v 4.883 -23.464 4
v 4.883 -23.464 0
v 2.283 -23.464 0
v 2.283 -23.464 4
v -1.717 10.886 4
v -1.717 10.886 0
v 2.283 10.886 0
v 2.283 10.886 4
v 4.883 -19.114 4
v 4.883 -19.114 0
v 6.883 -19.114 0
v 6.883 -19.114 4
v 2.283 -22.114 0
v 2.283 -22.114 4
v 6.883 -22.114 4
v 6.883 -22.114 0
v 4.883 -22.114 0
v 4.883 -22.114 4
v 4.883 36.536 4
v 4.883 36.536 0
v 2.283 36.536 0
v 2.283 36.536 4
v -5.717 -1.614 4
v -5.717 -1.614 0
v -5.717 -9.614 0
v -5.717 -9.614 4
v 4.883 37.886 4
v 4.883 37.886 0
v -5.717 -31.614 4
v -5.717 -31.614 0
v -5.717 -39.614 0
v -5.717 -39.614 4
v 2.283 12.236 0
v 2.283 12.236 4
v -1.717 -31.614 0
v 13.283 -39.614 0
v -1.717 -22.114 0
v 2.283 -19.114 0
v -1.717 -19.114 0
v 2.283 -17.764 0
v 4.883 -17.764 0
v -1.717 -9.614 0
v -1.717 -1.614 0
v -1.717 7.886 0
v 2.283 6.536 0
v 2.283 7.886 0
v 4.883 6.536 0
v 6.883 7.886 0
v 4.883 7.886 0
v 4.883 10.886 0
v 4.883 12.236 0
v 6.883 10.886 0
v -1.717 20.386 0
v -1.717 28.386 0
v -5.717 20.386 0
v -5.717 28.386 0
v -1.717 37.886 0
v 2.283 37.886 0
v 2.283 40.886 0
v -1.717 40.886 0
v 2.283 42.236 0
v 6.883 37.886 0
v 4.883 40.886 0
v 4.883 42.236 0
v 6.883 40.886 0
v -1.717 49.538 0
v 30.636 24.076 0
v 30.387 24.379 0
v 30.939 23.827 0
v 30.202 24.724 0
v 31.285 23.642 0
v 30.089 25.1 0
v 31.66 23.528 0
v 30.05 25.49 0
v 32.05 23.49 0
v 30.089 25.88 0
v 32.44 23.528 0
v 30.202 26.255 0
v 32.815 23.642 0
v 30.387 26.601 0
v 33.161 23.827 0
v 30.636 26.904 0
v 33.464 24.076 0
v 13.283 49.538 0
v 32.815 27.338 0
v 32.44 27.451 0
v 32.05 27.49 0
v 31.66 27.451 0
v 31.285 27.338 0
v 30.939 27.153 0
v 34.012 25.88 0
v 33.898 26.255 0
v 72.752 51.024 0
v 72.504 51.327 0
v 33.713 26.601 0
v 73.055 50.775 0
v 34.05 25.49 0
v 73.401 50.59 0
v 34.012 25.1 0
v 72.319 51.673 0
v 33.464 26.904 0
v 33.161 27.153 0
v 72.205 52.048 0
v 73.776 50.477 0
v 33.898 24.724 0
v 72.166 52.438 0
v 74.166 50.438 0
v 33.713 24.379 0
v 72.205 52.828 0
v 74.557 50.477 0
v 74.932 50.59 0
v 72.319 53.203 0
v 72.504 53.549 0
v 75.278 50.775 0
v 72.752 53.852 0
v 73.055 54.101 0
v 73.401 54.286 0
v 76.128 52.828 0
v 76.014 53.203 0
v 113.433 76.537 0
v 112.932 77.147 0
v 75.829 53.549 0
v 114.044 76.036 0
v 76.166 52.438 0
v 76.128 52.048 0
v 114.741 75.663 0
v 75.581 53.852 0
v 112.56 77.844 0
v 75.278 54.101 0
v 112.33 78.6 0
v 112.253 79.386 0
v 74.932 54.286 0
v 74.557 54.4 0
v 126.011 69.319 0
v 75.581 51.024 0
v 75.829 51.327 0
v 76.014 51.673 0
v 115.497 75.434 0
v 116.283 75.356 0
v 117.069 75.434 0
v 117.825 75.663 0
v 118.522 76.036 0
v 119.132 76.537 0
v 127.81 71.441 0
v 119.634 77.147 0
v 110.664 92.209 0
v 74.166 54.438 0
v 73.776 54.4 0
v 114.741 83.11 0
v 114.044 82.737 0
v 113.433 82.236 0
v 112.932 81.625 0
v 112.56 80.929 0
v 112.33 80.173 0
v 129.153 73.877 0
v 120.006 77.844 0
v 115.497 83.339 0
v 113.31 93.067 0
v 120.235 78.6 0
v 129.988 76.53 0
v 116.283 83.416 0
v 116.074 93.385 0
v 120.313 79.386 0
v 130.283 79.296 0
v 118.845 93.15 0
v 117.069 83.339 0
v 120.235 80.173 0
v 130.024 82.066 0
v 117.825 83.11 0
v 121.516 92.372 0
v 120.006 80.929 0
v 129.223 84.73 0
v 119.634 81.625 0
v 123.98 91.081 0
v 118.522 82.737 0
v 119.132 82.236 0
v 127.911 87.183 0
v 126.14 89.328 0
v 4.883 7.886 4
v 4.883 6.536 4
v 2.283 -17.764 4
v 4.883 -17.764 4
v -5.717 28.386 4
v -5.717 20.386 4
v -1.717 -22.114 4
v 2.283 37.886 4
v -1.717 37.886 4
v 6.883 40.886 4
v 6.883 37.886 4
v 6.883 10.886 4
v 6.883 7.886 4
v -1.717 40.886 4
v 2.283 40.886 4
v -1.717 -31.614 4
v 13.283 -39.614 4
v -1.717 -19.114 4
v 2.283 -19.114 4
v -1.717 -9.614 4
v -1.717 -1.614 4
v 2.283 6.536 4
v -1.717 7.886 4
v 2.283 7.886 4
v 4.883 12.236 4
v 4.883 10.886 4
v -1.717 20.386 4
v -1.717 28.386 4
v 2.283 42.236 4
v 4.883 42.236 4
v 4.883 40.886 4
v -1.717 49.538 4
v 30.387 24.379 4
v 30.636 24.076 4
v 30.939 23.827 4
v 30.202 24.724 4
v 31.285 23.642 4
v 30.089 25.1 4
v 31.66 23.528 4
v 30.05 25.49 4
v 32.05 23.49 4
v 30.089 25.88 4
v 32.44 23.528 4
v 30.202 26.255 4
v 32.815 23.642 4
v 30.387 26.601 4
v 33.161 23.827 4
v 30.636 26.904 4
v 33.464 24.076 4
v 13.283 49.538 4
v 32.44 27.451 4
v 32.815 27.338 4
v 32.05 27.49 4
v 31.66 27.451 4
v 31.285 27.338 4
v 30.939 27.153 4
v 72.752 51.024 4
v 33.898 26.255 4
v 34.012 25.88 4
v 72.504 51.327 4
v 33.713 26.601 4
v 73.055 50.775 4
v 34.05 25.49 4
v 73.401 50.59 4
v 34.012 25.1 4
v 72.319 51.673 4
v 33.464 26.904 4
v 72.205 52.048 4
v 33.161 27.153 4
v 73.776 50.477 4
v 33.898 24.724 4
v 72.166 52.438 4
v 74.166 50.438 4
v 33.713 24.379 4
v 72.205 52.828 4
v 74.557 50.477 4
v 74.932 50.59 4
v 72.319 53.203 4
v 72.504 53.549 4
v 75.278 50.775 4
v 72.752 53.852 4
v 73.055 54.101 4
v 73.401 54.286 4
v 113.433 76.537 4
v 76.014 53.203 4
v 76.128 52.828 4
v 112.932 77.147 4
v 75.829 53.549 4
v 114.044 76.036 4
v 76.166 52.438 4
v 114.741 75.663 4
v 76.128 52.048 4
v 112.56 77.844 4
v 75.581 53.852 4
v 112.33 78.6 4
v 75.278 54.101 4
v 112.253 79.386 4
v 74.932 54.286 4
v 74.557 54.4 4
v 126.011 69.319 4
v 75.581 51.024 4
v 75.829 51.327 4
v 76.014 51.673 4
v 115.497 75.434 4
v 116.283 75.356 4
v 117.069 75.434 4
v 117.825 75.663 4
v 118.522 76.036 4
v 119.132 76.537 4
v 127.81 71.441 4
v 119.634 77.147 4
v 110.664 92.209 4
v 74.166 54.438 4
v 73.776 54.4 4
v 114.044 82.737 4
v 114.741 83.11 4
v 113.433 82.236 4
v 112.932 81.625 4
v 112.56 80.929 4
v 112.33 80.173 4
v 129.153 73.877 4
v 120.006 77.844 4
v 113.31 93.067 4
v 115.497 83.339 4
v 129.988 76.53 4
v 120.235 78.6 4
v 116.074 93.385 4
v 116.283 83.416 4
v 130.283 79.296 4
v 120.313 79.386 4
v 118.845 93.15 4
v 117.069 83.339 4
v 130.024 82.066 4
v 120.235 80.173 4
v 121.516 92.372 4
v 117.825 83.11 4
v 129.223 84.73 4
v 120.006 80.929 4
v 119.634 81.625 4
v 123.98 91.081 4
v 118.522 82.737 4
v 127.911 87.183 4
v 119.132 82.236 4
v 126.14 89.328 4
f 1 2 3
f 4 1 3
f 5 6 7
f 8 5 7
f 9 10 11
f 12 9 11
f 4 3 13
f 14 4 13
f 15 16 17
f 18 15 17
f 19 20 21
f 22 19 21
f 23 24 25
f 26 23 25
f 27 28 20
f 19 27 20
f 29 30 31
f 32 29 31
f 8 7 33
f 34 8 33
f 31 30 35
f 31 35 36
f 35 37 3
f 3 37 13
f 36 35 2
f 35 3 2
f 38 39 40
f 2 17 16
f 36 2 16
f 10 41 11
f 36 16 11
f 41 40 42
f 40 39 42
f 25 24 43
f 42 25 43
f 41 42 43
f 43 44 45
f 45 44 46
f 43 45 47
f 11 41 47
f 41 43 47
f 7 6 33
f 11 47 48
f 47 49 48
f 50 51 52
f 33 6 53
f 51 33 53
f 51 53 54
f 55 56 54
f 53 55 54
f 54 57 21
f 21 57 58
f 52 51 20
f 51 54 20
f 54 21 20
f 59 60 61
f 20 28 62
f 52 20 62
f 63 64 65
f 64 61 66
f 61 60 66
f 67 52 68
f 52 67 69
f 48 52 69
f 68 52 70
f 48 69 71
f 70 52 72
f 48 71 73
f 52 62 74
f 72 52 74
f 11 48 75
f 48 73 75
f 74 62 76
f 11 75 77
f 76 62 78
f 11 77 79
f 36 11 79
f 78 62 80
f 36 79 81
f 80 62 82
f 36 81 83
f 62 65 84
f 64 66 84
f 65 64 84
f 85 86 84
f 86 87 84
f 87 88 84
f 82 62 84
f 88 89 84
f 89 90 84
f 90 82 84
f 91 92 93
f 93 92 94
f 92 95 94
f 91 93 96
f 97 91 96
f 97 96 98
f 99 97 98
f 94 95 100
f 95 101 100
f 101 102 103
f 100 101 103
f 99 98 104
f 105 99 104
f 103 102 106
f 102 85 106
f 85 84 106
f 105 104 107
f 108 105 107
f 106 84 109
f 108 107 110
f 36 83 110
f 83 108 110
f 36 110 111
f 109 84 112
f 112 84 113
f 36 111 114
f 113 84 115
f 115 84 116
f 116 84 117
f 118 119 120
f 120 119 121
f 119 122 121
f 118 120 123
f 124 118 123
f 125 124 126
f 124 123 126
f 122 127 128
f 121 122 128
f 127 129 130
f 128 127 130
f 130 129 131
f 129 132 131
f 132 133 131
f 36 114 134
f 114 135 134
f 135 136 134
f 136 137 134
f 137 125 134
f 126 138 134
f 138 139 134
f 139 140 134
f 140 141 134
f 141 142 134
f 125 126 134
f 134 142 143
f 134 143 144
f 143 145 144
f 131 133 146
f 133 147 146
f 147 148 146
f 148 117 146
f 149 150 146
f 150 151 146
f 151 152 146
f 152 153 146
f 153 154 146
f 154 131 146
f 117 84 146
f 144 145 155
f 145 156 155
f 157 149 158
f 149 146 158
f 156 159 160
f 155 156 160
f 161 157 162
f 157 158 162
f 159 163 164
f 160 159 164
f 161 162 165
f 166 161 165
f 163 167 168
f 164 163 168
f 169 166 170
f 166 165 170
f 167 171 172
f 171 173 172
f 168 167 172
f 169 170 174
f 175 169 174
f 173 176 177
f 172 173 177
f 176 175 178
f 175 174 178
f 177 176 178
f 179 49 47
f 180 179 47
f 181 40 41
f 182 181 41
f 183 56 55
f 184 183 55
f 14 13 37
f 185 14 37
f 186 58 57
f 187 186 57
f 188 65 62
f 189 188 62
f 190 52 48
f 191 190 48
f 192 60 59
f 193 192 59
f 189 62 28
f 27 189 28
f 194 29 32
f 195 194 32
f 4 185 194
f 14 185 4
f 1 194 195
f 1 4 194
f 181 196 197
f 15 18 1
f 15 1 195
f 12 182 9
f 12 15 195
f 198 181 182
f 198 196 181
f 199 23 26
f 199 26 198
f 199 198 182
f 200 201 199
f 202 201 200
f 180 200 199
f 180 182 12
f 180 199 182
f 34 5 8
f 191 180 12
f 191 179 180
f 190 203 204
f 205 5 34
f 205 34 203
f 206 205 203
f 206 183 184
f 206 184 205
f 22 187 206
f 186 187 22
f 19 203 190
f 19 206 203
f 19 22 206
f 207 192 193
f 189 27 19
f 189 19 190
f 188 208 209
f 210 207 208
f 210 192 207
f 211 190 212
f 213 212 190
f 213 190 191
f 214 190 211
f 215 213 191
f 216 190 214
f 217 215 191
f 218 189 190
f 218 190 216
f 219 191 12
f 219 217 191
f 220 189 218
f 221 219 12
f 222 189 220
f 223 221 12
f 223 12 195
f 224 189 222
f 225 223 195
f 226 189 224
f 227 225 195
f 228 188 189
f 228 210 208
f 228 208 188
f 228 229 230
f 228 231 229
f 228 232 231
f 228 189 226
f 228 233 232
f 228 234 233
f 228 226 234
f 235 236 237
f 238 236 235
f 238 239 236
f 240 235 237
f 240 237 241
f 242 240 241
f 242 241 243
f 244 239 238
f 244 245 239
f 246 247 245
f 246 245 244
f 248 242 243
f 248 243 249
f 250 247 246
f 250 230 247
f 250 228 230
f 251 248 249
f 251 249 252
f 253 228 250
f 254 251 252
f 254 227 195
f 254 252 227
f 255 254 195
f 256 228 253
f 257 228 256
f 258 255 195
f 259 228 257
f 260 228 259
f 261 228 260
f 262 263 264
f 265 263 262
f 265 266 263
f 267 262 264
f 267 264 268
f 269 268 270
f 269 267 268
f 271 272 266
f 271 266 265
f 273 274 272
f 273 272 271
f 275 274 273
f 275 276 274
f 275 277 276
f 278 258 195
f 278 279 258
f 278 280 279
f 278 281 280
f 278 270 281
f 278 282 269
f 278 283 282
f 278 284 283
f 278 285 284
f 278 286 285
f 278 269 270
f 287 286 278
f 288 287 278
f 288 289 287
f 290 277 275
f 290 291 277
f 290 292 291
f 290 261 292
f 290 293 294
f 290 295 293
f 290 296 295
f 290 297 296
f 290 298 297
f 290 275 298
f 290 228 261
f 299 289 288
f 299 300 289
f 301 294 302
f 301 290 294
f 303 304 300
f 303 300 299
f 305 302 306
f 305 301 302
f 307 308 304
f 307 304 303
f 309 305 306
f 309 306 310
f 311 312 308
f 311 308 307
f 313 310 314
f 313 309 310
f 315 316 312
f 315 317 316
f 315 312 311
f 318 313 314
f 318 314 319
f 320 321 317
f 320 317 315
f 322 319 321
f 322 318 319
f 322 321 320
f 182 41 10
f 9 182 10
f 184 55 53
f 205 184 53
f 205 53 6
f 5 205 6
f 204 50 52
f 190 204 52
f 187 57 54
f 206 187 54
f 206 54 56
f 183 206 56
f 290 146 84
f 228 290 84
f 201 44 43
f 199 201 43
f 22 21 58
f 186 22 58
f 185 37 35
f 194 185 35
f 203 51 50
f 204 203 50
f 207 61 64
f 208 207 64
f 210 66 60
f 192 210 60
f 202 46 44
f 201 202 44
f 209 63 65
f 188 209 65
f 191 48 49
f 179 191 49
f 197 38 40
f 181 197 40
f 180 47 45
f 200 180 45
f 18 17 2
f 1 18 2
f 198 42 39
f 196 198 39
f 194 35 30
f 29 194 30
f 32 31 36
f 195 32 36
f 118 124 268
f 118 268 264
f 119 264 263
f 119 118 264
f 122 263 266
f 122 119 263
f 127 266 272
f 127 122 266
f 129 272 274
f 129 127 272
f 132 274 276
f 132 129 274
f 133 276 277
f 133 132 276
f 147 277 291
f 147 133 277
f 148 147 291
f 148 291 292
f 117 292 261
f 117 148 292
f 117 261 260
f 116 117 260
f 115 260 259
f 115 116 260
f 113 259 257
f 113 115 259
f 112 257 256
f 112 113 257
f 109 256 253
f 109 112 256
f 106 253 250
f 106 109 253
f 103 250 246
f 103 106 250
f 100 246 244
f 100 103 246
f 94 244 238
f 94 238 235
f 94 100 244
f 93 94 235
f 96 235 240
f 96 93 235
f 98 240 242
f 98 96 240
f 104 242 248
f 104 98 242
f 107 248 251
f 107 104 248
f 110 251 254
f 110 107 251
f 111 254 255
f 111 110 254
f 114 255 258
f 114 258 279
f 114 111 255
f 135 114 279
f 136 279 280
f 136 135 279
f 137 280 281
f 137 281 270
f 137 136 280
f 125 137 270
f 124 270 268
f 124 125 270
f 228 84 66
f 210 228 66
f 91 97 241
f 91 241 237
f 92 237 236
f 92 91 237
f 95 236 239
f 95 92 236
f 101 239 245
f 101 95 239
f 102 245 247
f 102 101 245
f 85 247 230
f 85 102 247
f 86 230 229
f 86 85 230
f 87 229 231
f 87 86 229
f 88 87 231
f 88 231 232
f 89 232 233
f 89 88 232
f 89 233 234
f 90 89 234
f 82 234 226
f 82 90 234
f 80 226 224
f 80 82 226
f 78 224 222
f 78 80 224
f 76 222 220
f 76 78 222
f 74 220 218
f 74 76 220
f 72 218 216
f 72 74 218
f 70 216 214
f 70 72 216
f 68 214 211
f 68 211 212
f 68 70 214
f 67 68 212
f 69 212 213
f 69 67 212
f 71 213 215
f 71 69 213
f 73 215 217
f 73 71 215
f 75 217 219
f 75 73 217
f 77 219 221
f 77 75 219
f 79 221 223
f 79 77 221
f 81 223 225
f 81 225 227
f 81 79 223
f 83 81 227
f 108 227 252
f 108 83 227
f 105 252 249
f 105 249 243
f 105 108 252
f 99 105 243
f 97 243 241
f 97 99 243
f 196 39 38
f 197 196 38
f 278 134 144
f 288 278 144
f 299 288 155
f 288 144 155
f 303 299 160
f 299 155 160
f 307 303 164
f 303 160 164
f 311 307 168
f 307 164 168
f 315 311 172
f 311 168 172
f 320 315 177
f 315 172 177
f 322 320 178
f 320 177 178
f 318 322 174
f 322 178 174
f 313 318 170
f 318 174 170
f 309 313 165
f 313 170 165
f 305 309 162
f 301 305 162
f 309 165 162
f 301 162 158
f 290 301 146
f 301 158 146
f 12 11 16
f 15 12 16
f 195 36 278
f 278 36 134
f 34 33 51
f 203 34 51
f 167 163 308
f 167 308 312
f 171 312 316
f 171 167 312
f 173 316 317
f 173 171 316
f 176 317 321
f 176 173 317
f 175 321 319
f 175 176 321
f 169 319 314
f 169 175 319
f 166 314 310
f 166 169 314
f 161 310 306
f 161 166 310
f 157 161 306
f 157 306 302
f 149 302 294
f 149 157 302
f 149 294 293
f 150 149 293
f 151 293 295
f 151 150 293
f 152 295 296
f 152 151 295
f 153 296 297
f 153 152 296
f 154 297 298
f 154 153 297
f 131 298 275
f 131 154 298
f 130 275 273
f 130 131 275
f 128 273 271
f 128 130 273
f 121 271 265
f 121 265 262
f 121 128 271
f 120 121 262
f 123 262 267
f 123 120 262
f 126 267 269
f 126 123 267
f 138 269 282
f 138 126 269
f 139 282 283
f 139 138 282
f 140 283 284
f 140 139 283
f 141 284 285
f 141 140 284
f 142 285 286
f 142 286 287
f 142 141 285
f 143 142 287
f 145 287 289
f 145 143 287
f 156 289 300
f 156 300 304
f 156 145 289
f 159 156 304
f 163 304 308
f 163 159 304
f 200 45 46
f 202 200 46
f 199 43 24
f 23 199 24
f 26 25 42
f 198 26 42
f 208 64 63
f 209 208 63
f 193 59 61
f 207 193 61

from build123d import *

# Parameters (mm, degrees)
SKETCH_1_R      = 2
SKETCH_1_R_2    = 4.03
EXTRUDE_1_DEPTH = 4


with BuildPart() as part:
    # 草图1 → 凸台-拉伸1 (new body)
    with BuildSketch(Plane.XY):
        with BuildLine():
            Line((2.282857143, -22.113571429), (-1.717142857, -22.113571429))
            Line((-1.717142857, -22.113571429), (-1.717142857, -31.613571429))
            Line((-1.717142857, -31.613571429), (-5.717142857, -31.613571429))
            Line((-5.717142857, -31.613571429), (-5.717142857, -39.613571429))
            Line((-5.717142857, -39.613571429), (-1.717142857, -39.613571429))
            Line((-1.717142857, -39.613571429), (13.282857143, -39.613571429))
            Line((13.282857143, -39.613571429), (126.011390324, 69.318874641))
            ThreePointArc((126.011390324, 69.318874641), (127.911107543, 87.182824703), (110.66398275, 92.20938652))
            Line((110.66398275, 92.20938652), (13.282857143, 49.538084372))
            Line((13.282857143, 49.538084372), (-1.717142857, 49.538084372))
            Line((-1.717142857, 49.538084372), (-1.717142857, 40.886428571))
            Line((-1.717142857, 40.886428571), (2.282857143, 40.886428571))
            Line((2.282857143, 40.886428571), (2.282857143, 42.236428571))
            Line((2.282857143, 42.236428571), (4.882857143, 42.236428571))
            Line((4.882857143, 42.236428571), (4.882857143, 40.886428571))
            Line((4.882857143, 40.886428571), (6.882857143, 40.886428571))
            Line((6.882857143, 40.886428571), (6.882857143, 37.886428571))
            Line((6.882857143, 37.886428571), (4.882857143, 37.886428571))
            Line((4.882857143, 37.886428571), (4.882857143, 36.536428571))
            Line((4.882857143, 36.536428571), (2.282857143, 36.536428571))
            Line((2.282857143, 36.536428571), (2.282857143, 37.886428571))
            Line((2.282857143, 37.886428571), (-1.717142857, 37.886428571))
            Line((-1.717142857, 37.886428571), (-1.717142857, 28.386428571))
            Line((-1.717142857, 28.386428571), (-5.717142857, 28.386428571))
            Line((-5.717142857, 28.386428571), (-5.717142857, 20.386428571))
            Line((-5.717142857, 20.386428571), (-1.717142857, 20.386428571))
            Line((-1.717142857, 20.386428571), (-1.717142857, 10.886428571))
            Line((-1.717142857, 10.886428571), (2.282857143, 10.886428571))
            Line((2.282857143, 10.886428571), (2.282857143, 12.236428571))
            Line((2.282857143, 12.236428571), (4.882857143, 12.236428571))
            Line((4.882857143, 12.236428571), (4.882857143, 10.886428571))
            Line((4.882857143, 10.886428571), (6.882857143, 10.886428571))
            Line((6.882857143, 10.886428571), (6.882857143, 7.886428571))
            Line((6.882857143, 7.886428571), (4.882857143, 7.886428571))
            Line((4.882857143, 7.886428571), (4.882857143, 6.536428571))
            Line((4.882857143, 6.536428571), (2.282857143, 6.536428571))
            Line((2.282857143, 6.536428571), (2.282857143, 7.886428571))
            Line((2.282857143, 7.886428571), (-1.717142857, 7.886428571))
            Line((-1.717142857, 7.886428571), (-1.717142857, -1.613571429))
            Line((-1.717142857, -1.613571429), (-5.717142857, -1.613571429))
            Line((-5.717142857, -1.613571429), (-5.717142857, -9.613571429))
            Line((-5.717142857, -9.613571429), (-1.717142857, -9.613571429))
            Line((-1.717142857, -9.613571429), (-1.717142857, -19.113571429))
            Line((-1.717142857, -19.113571429), (2.282857143, -19.113571429))
            Line((2.282857143, -19.113571429), (2.282857143, -17.763571429))
            Line((2.282857143, -17.763571429), (4.882857143, -17.763571429))
            Line((4.882857143, -17.763571429), (4.882857143, -19.113571429))
            Line((4.882857143, -19.113571429), (6.882857143, -19.113571429))
            Line((6.882857143, -19.113571429), (6.882857143, -22.113571429))
            Line((6.882857143, -22.113571429), (4.882857143, -22.113571429))
            Line((4.882857143, -22.113571429), (4.882857143, -23.463571429))
            Line((4.882857143, -23.463571429), (2.282857143, -23.463571429))
            Line((2.282857143, -23.463571429), (2.282857143, -22.113571429))
        make_face()
        with Locations((32.050124236, 25.489798741)):
            Circle(SKETCH_1_R, mode=Mode.SUBTRACT)
        with Locations((74.16649069, 52.438113656)):
            Circle(SKETCH_1_R, mode=Mode.SUBTRACT)
        with Locations((116.282857143, 79.386428571)):
            Circle(SKETCH_1_R_2, mode=Mode.SUBTRACT)
    extrude(amount=EXTRUDE_1_DEPTH)


solid = part.part
